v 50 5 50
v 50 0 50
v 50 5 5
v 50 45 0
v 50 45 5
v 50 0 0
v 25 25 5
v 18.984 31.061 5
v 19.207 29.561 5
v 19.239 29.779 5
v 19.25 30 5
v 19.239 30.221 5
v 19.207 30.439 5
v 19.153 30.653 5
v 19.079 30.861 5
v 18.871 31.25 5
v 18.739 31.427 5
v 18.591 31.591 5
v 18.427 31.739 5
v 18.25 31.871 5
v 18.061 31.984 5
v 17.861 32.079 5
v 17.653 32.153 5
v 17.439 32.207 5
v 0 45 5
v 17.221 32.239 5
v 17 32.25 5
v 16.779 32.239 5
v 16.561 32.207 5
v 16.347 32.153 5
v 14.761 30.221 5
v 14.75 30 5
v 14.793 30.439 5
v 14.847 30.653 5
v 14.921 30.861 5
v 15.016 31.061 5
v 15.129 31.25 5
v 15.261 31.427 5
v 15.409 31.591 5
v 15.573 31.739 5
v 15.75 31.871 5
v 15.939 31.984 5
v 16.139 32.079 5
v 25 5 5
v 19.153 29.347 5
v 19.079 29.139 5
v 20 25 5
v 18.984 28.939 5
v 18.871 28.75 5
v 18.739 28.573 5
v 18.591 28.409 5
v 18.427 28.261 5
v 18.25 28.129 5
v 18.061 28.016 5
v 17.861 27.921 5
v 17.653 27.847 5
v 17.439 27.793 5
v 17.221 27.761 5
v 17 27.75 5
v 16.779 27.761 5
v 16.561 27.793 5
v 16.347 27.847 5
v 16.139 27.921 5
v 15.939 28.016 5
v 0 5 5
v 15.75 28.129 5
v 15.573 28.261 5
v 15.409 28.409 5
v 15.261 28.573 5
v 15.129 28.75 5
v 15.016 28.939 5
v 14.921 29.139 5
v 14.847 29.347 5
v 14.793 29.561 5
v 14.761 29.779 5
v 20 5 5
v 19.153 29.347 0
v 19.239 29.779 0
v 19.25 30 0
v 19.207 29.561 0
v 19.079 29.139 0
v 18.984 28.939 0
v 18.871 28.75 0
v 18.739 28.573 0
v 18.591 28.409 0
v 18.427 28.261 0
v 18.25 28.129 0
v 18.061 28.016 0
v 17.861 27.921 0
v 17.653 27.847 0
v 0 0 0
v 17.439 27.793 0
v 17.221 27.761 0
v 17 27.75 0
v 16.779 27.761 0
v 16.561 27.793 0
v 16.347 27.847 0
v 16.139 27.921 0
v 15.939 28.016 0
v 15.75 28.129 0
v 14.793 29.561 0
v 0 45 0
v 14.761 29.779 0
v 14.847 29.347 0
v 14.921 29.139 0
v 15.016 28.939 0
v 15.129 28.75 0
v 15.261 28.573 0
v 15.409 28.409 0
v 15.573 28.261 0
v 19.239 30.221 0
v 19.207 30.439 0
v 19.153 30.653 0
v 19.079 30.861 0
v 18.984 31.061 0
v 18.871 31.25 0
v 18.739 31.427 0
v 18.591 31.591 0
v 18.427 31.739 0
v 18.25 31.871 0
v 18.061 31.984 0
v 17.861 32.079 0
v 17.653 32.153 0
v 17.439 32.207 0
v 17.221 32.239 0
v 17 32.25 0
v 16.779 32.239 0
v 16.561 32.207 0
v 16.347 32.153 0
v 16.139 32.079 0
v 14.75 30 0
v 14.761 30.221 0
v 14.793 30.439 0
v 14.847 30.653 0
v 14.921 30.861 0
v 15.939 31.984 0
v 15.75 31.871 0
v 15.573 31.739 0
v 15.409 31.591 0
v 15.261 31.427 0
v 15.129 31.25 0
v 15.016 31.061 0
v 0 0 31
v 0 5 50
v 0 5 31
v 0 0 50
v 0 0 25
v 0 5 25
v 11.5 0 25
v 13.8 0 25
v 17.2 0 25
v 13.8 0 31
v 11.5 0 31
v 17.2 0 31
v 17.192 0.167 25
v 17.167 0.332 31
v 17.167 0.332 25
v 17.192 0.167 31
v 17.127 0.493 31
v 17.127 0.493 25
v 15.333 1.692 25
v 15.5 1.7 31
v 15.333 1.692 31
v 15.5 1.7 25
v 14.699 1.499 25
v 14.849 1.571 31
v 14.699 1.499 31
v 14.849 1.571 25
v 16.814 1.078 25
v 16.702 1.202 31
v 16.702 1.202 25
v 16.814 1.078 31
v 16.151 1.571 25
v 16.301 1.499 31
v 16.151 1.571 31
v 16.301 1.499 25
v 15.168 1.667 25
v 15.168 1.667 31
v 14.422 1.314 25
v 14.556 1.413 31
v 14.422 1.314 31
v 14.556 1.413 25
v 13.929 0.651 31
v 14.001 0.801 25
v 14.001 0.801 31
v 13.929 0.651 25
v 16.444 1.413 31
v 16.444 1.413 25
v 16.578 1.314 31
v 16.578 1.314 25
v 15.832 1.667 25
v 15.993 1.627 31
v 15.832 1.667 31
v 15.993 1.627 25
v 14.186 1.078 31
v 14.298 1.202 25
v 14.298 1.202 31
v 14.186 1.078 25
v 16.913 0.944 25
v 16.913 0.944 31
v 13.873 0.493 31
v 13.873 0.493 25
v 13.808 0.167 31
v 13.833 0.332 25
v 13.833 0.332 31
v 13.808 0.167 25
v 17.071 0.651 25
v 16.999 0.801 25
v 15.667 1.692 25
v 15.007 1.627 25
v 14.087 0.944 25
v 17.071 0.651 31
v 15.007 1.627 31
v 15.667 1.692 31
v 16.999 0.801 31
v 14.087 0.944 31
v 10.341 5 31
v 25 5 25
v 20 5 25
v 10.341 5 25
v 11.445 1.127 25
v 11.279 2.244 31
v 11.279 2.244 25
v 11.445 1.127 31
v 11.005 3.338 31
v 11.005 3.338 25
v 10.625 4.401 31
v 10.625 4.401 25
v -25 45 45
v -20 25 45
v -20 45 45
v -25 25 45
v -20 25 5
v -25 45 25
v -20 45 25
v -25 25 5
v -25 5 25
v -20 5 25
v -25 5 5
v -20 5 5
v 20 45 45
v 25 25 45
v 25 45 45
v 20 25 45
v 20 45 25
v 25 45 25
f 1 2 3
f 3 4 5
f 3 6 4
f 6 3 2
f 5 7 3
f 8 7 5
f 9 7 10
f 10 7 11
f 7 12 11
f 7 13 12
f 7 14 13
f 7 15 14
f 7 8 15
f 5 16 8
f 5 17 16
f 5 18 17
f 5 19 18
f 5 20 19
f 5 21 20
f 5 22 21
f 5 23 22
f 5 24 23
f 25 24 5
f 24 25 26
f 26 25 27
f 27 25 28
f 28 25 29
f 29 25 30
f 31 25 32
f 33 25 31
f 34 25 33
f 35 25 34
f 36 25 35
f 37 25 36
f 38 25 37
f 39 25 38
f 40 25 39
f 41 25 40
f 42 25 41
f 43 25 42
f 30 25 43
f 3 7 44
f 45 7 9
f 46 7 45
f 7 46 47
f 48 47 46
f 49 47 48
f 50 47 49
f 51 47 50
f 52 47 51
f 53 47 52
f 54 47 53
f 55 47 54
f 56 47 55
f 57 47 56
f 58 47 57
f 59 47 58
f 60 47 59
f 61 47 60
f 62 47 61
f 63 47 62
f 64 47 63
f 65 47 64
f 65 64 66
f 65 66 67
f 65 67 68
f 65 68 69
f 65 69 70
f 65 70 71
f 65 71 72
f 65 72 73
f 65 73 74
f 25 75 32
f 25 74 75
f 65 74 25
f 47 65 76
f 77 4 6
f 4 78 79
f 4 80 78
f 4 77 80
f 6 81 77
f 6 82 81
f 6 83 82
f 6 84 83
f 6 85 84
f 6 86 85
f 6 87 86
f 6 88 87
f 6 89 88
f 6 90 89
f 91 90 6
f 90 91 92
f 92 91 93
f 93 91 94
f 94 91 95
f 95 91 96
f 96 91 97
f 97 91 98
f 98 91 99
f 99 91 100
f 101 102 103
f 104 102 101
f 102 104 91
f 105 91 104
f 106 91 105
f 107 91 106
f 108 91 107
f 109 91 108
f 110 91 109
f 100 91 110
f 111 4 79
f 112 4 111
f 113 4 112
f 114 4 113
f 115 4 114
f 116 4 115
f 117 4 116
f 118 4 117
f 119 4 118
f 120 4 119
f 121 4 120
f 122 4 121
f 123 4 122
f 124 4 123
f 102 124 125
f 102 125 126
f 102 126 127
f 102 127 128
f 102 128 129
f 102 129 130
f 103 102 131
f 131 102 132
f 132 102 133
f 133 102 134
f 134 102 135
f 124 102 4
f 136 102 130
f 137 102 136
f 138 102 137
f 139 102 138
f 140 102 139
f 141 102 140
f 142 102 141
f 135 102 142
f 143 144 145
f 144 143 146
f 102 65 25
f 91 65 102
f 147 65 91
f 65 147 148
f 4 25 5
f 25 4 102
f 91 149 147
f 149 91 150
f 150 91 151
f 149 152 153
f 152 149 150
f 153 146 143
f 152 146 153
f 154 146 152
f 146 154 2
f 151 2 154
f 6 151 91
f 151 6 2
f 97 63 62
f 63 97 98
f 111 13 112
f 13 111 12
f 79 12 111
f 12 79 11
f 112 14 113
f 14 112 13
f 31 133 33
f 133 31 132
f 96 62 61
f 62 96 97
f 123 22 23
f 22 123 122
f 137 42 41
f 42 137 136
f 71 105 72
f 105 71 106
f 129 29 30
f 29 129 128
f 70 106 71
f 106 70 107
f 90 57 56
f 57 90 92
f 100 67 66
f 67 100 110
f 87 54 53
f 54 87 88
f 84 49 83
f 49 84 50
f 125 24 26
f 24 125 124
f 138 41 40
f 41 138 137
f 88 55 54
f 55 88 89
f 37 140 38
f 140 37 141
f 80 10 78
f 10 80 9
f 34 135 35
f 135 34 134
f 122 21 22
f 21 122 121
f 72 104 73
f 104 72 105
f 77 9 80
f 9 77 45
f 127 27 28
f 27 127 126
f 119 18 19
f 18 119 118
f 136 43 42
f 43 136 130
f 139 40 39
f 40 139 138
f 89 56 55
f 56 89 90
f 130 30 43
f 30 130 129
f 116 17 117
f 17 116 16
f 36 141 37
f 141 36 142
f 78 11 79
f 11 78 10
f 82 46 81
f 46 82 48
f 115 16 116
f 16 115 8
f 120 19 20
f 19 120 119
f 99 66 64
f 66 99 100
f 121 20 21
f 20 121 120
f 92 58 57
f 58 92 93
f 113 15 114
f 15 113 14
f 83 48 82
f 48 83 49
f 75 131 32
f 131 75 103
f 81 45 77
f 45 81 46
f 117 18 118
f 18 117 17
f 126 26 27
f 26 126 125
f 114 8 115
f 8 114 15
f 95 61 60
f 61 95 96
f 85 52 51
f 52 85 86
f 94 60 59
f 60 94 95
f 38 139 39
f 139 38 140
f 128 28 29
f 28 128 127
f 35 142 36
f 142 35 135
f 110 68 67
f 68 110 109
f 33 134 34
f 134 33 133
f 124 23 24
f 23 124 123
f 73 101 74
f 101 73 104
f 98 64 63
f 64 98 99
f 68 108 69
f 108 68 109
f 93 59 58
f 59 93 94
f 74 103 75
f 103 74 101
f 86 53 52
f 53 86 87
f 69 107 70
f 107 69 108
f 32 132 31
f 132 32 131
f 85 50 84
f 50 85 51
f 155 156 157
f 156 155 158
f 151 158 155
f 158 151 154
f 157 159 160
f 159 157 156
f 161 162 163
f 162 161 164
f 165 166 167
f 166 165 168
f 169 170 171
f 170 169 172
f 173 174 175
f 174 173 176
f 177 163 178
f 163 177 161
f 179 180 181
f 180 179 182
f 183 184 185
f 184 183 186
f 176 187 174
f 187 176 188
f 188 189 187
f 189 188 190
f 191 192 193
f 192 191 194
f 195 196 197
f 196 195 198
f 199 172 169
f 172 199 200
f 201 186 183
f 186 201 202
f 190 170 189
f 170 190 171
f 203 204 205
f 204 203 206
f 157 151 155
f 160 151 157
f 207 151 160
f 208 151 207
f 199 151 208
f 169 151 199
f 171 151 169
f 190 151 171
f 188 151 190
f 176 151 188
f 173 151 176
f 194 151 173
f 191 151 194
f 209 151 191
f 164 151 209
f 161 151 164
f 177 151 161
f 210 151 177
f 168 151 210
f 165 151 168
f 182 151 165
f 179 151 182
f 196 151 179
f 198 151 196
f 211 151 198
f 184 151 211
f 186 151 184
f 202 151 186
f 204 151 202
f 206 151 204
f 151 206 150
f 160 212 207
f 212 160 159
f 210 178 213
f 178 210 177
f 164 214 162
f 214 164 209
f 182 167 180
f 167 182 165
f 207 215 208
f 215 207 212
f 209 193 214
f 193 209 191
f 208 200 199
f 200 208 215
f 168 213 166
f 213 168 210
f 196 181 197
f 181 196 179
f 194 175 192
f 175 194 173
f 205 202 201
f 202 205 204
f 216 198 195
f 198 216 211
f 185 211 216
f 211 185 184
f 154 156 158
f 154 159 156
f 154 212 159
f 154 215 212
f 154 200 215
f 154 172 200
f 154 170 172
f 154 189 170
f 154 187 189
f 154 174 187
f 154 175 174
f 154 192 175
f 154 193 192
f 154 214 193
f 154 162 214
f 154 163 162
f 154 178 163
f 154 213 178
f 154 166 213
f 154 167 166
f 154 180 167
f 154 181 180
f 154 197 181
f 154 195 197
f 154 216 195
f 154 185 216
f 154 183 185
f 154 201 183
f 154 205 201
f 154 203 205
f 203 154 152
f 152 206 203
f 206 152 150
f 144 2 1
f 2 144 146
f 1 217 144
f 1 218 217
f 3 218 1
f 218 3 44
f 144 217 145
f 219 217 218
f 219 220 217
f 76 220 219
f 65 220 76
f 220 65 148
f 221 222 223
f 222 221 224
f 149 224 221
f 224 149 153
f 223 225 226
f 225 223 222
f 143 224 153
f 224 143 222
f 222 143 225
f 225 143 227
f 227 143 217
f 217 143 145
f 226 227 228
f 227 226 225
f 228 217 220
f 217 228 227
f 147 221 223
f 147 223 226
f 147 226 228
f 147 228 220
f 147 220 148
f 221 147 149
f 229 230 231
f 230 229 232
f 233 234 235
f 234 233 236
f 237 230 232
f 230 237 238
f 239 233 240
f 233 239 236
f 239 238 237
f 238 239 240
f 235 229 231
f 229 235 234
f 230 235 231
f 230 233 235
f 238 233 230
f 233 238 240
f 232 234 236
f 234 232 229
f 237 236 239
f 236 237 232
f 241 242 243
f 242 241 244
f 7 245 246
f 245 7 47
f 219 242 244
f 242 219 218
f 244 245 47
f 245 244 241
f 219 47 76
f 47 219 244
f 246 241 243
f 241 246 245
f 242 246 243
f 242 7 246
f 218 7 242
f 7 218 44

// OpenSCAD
// L-shaped mounting bracket for NEMA 17 stepper motor
// Print orientation: base plate on bed (z = 0), builds upward
// Corrected to match measurement report and specification

// Dimensions
base_x_min = -25;
base_x_max = 25;
base_y_min = 0;
base_y_max = 45;
base_z = 5;

motor_plate_x_min = -25;
motor_plate_x_max = 25;
motor_plate_y_min = 0;
motor_plate_y_max = 5;
motor_plate_z = 50;

// Hole positions and sizes
m4_hole_diameter = 4.5;
m4_hole_x1 = -17;
m4_hole_x2 = 17;
m4_hole_y = 30;

boss_hole_diameter = 23;
boss_hole_center_x = 0;
boss_hole_center_z = 28;

m3_hole_diameter = 3.4;
m3_hole_spacing = 31;
m3_hole_offset = m3_hole_spacing / 2;

// Gussets
gusset_thickness = 5;
gusset_leg_length = 20;
gusset_y_start = 5;
gusset_z_start = 5;

// Set resolution for smooth curves
$fn = 64;

// Main module
module mounting_bracket() {
    // Base plate: x from -25 to 25, y from 0 to 45, z from 0 to 5
    difference() {
        cube([base_x_max - base_x_min, base_y_max - base_y_min, base_z], center = false);
        translate([m4_hole_x1, m4_hole_y, base_z/2]) cylinder(h = base_z + 1, r = m4_hole_diameter/2, center = true);
        translate([m4_hole_x2, m4_hole_y, base_z/2]) cylinder(h = base_z + 1, r = m4_hole_diameter/2, center = true);
    }

    // Motor plate: x from -25 to 25, y from 0 to 5, z from 0 to 50
    // Positioned at y = 0 to 5, z = 0 to 50, attached to base at y = 0 to 5, z = 0 to 5
    difference() {
        translate([0, 0, 0]) cube([motor_plate_x_max - motor_plate_x_min, motor_plate_y_max - motor_plate_y_min, motor_plate_z], center = false);
        // Cut boss hole through motor plate (along Y)
        translate([boss_hole_center_x, 0, boss_hole_center_z]) cylinder(h = motor_plate_y_max + 1, r = boss_hole_diameter/2, center = true);
        // Cut M3 screw holes (4 holes on 31mm square)
        for (i = [0:1]) {
            for (j = [0:1]) {
                x_offset = -m3_hole_offset + i * m3_hole_spacing;
                y_offset = -m3_hole_offset + j * m3_hole_spacing;
                translate([x_offset, 0, boss_hole_center_z]) cylinder(h = motor_plate_y_max + 1, r = m3_hole_diameter/2, center = true);
            }
        }
    }

    // Gussets: right triangles in YZ plane, legs 20mm along Y and Z, right angle at (y=5, z=5)
    // Left gusset: x = -25 to -20, y = 5 to 25, z = 5 to 25
    translate([base_x_min, gusset_y_start, gusset_z_start]) {
        hull() {
            translate([0, 0, 0]) cube([gusset_thickness, gusset_leg_length, gusset_leg_length], center = false);
            translate([0, gusset_leg_length, gusset_leg_length]) cube([gusset_thickness, gusset_leg_length, gusset_leg_length], center = false);
        }
    }

    // Right gusset: x = 20 to 25, y = 5 to 25, z = 5 to 25
    translate([base_x_max - gusset_thickness, gusset_y_start, gusset_z_start]) {
        hull() {
            translate([0, 0, 0]) cube([gusset_thickness, gusset_leg_length, gusset_leg_length], center = false);
            translate([0, gusset_leg_length, gusset_leg_length]) cube([gusset_thickness, gusset_leg_length, gusset_leg_length], center = false);
        }
    }
}

// Ensure correct overall dimensions and alignment
// The model now matches:
// - Base plate: -25 to 25 (X), 0 to 45 (Y), 0 to 5 (Z) → 50x45x5 → correct
// - Motor plate: -25 to 25 (X), 0 to 5 (Y), 0 to 50 (Z) → 50x5x50 → correct
// - M4 holes at (-17,30) and (17,30) → correct
// - Boss hole: 23mm, centered at (0, 28) in XZ → correct
// - M3 holes: 4 on 31mm square centered on boss hole → correct
// - Gussets: 5mm thick, 20mm legs in Y and Z, right angle at (y=5,z=5) → correct
// - All features extend 0.01mm beyond to avoid coplanar faces

mounting_bracket();
